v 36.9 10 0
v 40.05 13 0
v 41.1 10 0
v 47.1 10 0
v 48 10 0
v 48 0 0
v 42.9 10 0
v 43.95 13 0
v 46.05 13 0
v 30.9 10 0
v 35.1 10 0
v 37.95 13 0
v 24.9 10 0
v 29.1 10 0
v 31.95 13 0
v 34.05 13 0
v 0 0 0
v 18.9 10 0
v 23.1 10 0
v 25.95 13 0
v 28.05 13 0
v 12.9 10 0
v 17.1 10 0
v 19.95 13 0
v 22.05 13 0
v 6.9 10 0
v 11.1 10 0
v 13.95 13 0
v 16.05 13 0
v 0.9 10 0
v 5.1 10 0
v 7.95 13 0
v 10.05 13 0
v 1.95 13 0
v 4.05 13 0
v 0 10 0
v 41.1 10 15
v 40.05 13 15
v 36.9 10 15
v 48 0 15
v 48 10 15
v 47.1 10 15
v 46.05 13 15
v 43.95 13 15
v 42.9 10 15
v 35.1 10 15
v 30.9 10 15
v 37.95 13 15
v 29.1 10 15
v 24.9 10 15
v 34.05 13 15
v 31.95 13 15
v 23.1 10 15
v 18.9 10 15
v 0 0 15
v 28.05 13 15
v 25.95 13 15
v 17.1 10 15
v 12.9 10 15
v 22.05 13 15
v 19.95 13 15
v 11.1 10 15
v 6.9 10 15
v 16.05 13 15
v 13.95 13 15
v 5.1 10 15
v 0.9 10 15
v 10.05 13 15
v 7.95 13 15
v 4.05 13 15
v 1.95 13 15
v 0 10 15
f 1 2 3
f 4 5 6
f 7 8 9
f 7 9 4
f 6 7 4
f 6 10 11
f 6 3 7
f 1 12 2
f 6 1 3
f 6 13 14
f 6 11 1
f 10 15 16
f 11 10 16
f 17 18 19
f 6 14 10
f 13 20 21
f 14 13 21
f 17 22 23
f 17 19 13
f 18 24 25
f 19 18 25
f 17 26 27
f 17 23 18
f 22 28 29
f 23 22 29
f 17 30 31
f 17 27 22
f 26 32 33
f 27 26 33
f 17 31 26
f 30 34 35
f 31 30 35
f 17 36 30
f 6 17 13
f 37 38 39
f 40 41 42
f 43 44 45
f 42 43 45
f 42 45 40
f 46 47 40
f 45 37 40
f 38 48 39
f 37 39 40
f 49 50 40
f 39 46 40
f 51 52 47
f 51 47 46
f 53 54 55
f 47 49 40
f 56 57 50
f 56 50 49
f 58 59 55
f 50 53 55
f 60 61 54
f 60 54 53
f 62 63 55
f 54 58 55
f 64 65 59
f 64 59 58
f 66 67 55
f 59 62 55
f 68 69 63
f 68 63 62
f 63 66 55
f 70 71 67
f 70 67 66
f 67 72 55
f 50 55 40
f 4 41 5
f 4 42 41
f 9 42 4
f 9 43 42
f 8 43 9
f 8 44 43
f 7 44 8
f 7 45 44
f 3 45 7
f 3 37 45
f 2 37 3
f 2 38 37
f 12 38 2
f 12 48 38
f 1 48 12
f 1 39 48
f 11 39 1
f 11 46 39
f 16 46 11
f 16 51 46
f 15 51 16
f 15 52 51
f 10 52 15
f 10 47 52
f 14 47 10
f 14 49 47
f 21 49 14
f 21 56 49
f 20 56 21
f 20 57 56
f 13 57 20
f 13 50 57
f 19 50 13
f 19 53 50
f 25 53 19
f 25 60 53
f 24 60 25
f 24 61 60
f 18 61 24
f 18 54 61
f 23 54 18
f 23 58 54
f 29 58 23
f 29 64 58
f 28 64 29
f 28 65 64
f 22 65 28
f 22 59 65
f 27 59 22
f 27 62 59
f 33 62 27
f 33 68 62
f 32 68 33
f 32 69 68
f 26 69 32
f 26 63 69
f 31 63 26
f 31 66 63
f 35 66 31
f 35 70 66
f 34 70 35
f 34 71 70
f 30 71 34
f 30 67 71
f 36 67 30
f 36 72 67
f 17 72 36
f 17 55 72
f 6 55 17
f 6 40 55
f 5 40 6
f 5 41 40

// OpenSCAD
$fn = 32;

// ----------------------------------------------------------------------
// Gear rack: 8 teeth, pitch 6 mm
// ----------------------------------------------------------------------

// --- parameters (mm) ---
teeth = 8;                // number of teeth
pitch = 6;                // tooth pitch, X
root_w = 4.2;             // tooth width at the root
tip_w = 2.1;              // tooth width at the tip
base_h = 10;              // rack body height, Y
tooth_h = 3;              // tooth height above the body
plate_t = 15;             // rack width, Z (extrusion height)
fit_tol = 0.05;           // declared fit tolerance (prompt contract)
free_tol = 0.3;           // declared free tolerance (prompt contract)

rack_l = teeth * pitch;  // overall length
total_h = base_h + tooth_h;  // overall height

profile = [[0, 0], [48, 0], [48, 10], [47.1, 10], [46.05, 13], [43.95, 13], [42.9, 10], [41.1, 10], [40.05, 13], [37.95, 13], [36.9, 10], [35.1, 10], [34.05, 13], [31.95, 13], [30.9, 10], [29.1, 10], [28.05, 13], [25.95, 13], [24.9, 10], [23.1, 10], [22.05, 13], [19.95, 13], [18.9, 10], [17.1, 10], [16.05, 13], [13.95, 13], [12.9, 10], [11.1, 10], [10.05, 13], [7.95, 13], [6.9, 10], [5.1, 10], [4.05, 13], [1.95, 13], [0.9, 10], [0, 10]];  // primary outline, 36 points, counter clockwise

// --- the one profile operation ---
linear_extrude(height = plate_t) polygon(points = profile);
